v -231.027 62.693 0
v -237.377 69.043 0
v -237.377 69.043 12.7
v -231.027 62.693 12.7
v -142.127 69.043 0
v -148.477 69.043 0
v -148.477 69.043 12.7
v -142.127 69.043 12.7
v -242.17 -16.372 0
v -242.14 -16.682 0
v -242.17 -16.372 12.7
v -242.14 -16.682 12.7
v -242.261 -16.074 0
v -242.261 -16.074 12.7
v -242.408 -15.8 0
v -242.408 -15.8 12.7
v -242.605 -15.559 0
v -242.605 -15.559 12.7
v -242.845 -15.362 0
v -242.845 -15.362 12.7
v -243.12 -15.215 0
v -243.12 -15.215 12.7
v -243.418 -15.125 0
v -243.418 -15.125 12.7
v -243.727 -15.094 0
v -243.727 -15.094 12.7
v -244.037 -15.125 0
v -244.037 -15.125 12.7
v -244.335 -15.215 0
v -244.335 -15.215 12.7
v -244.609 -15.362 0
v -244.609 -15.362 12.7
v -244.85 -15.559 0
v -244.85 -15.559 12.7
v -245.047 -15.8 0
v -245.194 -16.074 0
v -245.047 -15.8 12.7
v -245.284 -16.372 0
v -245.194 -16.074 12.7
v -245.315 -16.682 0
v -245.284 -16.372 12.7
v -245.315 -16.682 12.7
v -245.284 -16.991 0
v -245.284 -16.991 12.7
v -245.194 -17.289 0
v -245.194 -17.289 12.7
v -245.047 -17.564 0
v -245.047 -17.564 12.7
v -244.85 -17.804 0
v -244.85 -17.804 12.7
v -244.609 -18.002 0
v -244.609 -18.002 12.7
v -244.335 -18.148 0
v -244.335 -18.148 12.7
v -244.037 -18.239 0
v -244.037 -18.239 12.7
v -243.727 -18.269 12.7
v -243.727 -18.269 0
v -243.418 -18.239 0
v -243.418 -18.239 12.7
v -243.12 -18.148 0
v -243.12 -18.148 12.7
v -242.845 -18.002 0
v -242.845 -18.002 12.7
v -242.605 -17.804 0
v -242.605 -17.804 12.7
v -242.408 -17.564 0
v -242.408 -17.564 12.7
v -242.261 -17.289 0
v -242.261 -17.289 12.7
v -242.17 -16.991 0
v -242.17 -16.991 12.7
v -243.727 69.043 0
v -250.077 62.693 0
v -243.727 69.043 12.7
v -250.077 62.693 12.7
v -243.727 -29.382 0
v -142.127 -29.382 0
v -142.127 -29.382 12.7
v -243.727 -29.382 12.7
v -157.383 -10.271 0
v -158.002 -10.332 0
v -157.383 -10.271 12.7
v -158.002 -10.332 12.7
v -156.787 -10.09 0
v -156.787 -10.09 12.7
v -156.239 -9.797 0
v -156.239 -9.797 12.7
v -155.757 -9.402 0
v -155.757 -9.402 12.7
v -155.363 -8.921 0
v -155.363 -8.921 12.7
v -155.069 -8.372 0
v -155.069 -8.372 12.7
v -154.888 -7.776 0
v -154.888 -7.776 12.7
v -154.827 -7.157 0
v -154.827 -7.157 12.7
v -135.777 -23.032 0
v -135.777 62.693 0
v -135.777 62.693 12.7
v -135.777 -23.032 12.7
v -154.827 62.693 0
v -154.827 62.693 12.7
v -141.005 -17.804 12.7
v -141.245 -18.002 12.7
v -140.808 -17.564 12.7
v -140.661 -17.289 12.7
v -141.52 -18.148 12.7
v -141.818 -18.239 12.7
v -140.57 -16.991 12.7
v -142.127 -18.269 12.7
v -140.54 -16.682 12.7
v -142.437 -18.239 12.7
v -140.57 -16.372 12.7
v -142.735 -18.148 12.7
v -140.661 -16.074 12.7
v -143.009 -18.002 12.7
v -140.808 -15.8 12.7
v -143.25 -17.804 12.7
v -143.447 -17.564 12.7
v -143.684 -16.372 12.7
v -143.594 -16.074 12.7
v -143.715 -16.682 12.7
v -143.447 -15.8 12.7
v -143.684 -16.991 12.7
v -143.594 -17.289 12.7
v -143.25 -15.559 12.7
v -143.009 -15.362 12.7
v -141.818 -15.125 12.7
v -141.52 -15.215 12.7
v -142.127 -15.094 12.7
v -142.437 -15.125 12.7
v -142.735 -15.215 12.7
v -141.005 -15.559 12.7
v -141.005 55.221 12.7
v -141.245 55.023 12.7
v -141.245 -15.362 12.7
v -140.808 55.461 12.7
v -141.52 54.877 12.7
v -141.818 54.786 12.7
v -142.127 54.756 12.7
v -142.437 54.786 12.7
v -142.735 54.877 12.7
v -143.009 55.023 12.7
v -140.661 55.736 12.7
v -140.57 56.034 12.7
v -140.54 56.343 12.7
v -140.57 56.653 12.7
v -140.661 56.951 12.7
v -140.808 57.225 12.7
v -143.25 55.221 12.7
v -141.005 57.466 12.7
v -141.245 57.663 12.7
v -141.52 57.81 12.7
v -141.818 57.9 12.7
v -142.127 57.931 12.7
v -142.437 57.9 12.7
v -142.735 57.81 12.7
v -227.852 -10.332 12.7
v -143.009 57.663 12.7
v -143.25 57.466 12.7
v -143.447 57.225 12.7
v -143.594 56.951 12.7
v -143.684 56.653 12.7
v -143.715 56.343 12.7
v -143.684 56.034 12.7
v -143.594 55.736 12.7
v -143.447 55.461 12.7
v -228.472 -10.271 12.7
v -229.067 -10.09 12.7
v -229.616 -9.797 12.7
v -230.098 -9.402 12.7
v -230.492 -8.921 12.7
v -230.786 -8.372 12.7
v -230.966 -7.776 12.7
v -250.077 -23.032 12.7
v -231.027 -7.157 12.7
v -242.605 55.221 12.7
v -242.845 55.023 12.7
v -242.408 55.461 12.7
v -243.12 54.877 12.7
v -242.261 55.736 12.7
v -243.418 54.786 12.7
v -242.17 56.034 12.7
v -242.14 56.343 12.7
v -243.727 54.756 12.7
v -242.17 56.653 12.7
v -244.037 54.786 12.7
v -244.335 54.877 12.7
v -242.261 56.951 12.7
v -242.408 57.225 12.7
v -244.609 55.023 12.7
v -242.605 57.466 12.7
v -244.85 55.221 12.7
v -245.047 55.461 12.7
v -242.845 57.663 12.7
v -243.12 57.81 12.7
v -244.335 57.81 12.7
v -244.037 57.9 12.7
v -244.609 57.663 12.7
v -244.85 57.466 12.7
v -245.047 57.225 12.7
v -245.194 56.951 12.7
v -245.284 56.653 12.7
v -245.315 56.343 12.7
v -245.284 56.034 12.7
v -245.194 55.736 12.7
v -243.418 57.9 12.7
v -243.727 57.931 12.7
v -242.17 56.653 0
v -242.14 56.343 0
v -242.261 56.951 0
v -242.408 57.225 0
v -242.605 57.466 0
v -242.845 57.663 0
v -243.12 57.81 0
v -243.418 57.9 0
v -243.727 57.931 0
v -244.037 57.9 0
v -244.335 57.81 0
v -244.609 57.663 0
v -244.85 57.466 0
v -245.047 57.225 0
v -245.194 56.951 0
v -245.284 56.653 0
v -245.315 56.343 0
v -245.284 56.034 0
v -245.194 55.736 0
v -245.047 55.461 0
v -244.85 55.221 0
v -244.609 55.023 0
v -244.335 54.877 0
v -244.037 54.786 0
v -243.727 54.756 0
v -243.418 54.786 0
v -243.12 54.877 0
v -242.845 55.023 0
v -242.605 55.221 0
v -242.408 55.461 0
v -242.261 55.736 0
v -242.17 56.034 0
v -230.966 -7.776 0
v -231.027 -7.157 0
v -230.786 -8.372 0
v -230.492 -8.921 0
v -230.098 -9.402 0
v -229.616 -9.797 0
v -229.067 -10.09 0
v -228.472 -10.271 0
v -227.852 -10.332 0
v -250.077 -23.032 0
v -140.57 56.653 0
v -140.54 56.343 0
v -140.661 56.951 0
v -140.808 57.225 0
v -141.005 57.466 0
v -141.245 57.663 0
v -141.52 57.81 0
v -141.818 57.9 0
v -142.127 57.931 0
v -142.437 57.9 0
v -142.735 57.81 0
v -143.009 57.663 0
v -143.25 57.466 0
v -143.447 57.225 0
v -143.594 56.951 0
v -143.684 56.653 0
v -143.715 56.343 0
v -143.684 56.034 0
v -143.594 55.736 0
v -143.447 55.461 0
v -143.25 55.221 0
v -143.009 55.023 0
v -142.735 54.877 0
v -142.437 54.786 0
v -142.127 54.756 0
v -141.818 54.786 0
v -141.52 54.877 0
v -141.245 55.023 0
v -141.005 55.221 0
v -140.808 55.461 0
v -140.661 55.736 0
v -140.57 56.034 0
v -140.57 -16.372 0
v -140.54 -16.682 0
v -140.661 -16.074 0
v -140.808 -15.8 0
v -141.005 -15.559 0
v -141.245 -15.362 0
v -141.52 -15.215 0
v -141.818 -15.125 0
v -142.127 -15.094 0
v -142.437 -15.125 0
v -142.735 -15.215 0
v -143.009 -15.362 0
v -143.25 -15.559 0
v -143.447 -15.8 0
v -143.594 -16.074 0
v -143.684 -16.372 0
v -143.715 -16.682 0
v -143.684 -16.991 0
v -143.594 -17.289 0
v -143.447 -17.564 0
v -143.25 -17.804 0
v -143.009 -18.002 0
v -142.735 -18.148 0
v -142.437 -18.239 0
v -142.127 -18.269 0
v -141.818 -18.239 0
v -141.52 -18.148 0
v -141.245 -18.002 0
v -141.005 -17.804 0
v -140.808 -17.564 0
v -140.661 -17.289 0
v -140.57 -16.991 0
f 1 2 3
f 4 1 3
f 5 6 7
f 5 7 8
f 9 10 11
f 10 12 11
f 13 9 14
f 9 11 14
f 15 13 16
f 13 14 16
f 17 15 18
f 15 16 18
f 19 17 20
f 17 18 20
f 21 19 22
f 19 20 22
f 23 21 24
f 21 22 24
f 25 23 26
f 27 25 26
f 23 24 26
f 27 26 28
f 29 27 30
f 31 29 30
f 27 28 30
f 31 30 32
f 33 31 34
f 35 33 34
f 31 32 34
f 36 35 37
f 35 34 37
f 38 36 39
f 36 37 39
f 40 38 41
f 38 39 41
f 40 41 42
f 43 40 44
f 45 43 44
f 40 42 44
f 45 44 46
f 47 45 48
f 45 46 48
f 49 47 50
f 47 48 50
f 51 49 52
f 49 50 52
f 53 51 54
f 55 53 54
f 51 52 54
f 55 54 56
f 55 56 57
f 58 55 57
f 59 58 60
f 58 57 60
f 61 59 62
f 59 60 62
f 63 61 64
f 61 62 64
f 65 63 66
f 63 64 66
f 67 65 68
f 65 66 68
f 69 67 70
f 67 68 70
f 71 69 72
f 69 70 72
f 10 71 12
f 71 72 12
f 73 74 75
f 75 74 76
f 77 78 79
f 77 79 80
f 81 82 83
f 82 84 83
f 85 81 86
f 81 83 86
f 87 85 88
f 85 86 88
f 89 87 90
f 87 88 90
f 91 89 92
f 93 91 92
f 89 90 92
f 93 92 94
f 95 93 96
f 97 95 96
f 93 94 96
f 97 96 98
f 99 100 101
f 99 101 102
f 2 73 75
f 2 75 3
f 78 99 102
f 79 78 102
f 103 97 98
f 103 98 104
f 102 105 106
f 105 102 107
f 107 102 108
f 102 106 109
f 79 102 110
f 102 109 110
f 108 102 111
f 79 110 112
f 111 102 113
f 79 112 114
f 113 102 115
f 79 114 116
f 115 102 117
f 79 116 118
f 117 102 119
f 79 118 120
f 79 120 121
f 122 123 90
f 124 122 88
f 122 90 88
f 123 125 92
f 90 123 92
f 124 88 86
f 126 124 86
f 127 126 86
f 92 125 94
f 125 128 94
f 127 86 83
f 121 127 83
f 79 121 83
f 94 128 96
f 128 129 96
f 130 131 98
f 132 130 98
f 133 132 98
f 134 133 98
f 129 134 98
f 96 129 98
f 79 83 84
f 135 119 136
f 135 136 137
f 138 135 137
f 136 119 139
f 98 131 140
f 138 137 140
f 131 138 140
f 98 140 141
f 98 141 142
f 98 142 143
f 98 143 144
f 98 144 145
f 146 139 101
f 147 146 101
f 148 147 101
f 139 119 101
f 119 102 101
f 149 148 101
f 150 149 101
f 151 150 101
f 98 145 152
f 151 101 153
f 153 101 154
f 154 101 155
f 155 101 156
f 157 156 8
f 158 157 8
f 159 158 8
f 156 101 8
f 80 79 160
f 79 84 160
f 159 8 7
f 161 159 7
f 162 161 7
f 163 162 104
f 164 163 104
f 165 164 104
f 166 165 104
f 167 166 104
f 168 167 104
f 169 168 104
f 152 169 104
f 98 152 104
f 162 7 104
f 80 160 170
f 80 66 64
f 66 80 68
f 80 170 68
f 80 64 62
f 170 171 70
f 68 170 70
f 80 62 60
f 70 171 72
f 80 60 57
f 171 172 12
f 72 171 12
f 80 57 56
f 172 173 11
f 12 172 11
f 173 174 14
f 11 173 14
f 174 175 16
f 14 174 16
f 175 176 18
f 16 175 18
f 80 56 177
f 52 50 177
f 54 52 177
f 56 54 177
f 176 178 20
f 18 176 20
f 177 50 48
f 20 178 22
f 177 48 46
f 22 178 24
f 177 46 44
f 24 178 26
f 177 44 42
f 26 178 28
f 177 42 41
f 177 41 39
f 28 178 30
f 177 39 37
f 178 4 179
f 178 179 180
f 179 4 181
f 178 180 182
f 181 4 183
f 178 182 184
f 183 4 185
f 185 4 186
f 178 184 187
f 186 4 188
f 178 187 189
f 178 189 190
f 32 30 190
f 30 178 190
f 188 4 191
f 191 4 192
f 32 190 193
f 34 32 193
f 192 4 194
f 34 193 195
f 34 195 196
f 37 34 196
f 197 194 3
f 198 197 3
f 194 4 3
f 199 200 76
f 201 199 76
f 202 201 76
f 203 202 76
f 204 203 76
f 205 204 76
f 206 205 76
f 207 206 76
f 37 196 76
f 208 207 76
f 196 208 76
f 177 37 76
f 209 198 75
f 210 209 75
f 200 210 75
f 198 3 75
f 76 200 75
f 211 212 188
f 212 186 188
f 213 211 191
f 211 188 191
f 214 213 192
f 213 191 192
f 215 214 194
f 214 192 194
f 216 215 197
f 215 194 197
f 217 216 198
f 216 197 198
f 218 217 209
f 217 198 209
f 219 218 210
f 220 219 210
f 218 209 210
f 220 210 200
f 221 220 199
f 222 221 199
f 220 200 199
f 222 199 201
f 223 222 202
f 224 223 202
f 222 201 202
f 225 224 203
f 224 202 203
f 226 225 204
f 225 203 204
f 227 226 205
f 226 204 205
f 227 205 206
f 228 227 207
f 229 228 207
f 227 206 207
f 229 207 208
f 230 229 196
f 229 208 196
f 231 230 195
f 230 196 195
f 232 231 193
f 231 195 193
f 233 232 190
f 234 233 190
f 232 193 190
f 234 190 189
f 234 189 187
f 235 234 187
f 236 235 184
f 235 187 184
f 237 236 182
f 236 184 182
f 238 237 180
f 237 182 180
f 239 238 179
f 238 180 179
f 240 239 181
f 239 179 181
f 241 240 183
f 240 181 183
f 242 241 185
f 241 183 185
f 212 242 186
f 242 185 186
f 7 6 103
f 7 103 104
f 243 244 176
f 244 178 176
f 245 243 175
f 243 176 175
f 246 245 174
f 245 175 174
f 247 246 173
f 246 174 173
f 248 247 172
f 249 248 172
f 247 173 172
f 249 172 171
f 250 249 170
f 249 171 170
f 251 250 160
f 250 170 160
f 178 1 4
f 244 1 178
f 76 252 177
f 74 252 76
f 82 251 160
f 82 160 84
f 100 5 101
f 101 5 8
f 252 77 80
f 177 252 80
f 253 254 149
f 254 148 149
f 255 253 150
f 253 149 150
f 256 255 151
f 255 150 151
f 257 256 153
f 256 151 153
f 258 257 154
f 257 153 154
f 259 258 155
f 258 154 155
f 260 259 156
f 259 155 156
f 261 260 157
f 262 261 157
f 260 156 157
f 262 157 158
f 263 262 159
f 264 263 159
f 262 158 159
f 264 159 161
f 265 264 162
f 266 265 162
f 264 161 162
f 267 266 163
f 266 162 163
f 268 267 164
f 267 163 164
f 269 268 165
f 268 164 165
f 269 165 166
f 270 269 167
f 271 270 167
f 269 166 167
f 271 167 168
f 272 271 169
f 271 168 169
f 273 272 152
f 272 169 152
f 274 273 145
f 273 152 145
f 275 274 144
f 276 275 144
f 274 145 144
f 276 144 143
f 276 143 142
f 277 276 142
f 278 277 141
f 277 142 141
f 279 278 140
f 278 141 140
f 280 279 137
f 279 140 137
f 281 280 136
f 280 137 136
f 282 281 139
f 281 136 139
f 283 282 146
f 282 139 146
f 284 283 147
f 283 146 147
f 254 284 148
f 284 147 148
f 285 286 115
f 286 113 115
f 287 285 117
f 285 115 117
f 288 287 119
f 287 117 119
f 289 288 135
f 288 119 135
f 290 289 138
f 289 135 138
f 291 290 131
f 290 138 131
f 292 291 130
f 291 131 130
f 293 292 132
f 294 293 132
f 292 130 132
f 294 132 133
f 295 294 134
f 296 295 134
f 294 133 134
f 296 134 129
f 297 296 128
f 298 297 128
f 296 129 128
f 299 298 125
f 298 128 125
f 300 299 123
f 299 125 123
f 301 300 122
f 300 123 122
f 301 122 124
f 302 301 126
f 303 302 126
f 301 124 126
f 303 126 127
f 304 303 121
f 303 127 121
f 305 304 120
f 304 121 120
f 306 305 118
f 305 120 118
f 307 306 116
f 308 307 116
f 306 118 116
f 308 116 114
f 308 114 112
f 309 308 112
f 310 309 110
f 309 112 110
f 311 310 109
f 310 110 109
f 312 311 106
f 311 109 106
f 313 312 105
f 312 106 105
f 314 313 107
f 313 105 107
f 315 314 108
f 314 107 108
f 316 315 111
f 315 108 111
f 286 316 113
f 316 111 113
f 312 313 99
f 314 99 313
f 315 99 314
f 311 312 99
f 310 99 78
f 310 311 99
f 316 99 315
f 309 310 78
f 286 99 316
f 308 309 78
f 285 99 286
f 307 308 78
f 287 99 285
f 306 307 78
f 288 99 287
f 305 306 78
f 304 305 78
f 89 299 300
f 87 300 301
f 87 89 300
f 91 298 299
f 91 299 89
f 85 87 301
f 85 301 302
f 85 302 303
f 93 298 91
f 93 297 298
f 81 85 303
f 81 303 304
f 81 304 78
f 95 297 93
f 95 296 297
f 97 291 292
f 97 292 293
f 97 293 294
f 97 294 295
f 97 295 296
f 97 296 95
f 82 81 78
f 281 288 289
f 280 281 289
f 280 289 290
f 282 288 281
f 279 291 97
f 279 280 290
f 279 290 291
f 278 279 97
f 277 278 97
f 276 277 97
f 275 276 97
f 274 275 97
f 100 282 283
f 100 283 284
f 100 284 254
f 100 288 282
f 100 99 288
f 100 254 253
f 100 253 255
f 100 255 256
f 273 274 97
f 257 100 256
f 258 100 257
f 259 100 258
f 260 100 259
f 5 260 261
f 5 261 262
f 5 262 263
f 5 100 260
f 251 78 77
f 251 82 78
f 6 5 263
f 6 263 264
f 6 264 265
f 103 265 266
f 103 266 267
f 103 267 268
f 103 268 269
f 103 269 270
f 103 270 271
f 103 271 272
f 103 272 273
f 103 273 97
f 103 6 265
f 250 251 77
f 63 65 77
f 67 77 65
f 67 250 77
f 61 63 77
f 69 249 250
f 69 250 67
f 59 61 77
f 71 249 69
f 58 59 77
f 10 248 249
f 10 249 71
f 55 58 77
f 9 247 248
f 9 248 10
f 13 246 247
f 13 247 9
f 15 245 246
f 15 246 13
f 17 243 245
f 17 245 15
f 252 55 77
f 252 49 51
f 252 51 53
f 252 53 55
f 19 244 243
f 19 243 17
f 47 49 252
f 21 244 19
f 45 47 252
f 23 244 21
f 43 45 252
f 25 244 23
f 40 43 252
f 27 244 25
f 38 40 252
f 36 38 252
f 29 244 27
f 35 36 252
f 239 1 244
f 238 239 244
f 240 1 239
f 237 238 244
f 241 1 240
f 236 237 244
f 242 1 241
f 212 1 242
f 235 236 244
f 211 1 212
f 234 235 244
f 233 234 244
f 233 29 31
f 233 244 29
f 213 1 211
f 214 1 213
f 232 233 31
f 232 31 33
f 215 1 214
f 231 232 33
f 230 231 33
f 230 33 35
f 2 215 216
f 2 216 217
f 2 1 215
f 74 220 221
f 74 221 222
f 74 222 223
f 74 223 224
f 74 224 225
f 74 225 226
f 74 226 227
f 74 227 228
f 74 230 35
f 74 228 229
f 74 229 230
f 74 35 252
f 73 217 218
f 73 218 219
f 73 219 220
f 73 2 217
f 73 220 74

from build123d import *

# Parameters (mm, degrees)
BOSS_EXTRUDE1_DEPTH = 12.7
FILLET1_R           = 3.175
CHAMFER1_SIZE       = 6.35
HOLE1_D             = 3.175
HOLE1_DEPTH         = 31.75
HOLE1_CSINK_D       = 10.16
HOLE1_CSINK_ANGLE   = 82
HOLE1_TIP           = 0.953866233


with BuildPart() as part:
    # Sketch1 → Boss-Extrude1 (new body)
    with BuildSketch(Plane.XY):
        Polygon((-231.027465963, 69.04320968), (-231.027465963, -10.33179032), (-154.827465963, -10.33179032), (-154.827465963, 69.04320968), (-135.777465963, 69.04320968), (-135.777465963, -29.38179032), (-250.077465963, -29.38179032), (-250.077465963, 69.04320968), align=None)
    extrude(amount=BOSS_EXTRUDE1_DEPTH)

    # Fillet1
    fillet1_edges = [part.edges().sort_by_distance(p)[0] for p in [
        (-231.027465963, -10.33179032, 6.35),
        (-154.827465963, -10.33179032, 6.35),
    ]]
    fillet(fillet1_edges, radius=FILLET1_R)

    # Chamfer1
    chamfer1_edges = [part.edges().sort_by_distance(p)[0] for p in [
        (-231.027465963, 69.04320968, 6.35),
        (-154.827465963, 69.04320968, 6.35),
        (-135.777465963, 69.04320968, 6.35),
        (-135.777465963, -29.38179032, 6.35),
        (-250.077465963, -29.38179032, 6.35),
        (-250.077465963, 69.04320968, 6.35),
    ]]
    chamfer(chamfer1_edges, length=CHAMFER1_SIZE)

    # Hole1
    with Locations(Plane(origin=(-124.004465969, -215.287141225, -12.7), x_dir=(-1, 0, 0), z_dir=(0, 0, -1))):
        with Locations((113.649999994, 128.807623392), (113.649999994, 23.940956725), (-94.599999994, 161.374290059), (94.599999994, 161.374290059), (0, 161.374290059), (0, 193.124290059), (0, 440.553783621), (0, 301.970350905), (40.979166666, 301.970350905), (166.795833328, 301.970350905), (207.774999994, 440.553783621), (207.774999994, 333.02141023), (207.774999994, 225.48903684), (207.774999994, 137.424290059), (207.774999994, 10.424290059), (-207.774999994, 10.424290059), (-207.774999994, 137.424290059), (-207.774999994, 225.48903684), (-207.774999994, 333.02141023), (-207.774999994, 440.553783621), (-166.795833328, 301.970350905), (-40.979166666, 301.970350905), (-113.649999994, 23.940956725), (-113.649999994, 128.807623392), (119.722999994, 198.605350905), (119.722999994, 271.630350905), (18.122999994, 198.605350905), (18.122999994, 271.630350905)):
            CounterSinkHole(HOLE1_D / 2, HOLE1_CSINK_D / 2, depth=HOLE1_DEPTH, counter_sink_angle=HOLE1_CSINK_ANGLE)
            with Locations((0, 0, -(HOLE1_DEPTH + HOLE1_TIP / 2))):  # 118° drill point
                Cone(0, HOLE1_D / 2, HOLE1_TIP, mode=Mode.SUBTRACT)


solid = part.part
